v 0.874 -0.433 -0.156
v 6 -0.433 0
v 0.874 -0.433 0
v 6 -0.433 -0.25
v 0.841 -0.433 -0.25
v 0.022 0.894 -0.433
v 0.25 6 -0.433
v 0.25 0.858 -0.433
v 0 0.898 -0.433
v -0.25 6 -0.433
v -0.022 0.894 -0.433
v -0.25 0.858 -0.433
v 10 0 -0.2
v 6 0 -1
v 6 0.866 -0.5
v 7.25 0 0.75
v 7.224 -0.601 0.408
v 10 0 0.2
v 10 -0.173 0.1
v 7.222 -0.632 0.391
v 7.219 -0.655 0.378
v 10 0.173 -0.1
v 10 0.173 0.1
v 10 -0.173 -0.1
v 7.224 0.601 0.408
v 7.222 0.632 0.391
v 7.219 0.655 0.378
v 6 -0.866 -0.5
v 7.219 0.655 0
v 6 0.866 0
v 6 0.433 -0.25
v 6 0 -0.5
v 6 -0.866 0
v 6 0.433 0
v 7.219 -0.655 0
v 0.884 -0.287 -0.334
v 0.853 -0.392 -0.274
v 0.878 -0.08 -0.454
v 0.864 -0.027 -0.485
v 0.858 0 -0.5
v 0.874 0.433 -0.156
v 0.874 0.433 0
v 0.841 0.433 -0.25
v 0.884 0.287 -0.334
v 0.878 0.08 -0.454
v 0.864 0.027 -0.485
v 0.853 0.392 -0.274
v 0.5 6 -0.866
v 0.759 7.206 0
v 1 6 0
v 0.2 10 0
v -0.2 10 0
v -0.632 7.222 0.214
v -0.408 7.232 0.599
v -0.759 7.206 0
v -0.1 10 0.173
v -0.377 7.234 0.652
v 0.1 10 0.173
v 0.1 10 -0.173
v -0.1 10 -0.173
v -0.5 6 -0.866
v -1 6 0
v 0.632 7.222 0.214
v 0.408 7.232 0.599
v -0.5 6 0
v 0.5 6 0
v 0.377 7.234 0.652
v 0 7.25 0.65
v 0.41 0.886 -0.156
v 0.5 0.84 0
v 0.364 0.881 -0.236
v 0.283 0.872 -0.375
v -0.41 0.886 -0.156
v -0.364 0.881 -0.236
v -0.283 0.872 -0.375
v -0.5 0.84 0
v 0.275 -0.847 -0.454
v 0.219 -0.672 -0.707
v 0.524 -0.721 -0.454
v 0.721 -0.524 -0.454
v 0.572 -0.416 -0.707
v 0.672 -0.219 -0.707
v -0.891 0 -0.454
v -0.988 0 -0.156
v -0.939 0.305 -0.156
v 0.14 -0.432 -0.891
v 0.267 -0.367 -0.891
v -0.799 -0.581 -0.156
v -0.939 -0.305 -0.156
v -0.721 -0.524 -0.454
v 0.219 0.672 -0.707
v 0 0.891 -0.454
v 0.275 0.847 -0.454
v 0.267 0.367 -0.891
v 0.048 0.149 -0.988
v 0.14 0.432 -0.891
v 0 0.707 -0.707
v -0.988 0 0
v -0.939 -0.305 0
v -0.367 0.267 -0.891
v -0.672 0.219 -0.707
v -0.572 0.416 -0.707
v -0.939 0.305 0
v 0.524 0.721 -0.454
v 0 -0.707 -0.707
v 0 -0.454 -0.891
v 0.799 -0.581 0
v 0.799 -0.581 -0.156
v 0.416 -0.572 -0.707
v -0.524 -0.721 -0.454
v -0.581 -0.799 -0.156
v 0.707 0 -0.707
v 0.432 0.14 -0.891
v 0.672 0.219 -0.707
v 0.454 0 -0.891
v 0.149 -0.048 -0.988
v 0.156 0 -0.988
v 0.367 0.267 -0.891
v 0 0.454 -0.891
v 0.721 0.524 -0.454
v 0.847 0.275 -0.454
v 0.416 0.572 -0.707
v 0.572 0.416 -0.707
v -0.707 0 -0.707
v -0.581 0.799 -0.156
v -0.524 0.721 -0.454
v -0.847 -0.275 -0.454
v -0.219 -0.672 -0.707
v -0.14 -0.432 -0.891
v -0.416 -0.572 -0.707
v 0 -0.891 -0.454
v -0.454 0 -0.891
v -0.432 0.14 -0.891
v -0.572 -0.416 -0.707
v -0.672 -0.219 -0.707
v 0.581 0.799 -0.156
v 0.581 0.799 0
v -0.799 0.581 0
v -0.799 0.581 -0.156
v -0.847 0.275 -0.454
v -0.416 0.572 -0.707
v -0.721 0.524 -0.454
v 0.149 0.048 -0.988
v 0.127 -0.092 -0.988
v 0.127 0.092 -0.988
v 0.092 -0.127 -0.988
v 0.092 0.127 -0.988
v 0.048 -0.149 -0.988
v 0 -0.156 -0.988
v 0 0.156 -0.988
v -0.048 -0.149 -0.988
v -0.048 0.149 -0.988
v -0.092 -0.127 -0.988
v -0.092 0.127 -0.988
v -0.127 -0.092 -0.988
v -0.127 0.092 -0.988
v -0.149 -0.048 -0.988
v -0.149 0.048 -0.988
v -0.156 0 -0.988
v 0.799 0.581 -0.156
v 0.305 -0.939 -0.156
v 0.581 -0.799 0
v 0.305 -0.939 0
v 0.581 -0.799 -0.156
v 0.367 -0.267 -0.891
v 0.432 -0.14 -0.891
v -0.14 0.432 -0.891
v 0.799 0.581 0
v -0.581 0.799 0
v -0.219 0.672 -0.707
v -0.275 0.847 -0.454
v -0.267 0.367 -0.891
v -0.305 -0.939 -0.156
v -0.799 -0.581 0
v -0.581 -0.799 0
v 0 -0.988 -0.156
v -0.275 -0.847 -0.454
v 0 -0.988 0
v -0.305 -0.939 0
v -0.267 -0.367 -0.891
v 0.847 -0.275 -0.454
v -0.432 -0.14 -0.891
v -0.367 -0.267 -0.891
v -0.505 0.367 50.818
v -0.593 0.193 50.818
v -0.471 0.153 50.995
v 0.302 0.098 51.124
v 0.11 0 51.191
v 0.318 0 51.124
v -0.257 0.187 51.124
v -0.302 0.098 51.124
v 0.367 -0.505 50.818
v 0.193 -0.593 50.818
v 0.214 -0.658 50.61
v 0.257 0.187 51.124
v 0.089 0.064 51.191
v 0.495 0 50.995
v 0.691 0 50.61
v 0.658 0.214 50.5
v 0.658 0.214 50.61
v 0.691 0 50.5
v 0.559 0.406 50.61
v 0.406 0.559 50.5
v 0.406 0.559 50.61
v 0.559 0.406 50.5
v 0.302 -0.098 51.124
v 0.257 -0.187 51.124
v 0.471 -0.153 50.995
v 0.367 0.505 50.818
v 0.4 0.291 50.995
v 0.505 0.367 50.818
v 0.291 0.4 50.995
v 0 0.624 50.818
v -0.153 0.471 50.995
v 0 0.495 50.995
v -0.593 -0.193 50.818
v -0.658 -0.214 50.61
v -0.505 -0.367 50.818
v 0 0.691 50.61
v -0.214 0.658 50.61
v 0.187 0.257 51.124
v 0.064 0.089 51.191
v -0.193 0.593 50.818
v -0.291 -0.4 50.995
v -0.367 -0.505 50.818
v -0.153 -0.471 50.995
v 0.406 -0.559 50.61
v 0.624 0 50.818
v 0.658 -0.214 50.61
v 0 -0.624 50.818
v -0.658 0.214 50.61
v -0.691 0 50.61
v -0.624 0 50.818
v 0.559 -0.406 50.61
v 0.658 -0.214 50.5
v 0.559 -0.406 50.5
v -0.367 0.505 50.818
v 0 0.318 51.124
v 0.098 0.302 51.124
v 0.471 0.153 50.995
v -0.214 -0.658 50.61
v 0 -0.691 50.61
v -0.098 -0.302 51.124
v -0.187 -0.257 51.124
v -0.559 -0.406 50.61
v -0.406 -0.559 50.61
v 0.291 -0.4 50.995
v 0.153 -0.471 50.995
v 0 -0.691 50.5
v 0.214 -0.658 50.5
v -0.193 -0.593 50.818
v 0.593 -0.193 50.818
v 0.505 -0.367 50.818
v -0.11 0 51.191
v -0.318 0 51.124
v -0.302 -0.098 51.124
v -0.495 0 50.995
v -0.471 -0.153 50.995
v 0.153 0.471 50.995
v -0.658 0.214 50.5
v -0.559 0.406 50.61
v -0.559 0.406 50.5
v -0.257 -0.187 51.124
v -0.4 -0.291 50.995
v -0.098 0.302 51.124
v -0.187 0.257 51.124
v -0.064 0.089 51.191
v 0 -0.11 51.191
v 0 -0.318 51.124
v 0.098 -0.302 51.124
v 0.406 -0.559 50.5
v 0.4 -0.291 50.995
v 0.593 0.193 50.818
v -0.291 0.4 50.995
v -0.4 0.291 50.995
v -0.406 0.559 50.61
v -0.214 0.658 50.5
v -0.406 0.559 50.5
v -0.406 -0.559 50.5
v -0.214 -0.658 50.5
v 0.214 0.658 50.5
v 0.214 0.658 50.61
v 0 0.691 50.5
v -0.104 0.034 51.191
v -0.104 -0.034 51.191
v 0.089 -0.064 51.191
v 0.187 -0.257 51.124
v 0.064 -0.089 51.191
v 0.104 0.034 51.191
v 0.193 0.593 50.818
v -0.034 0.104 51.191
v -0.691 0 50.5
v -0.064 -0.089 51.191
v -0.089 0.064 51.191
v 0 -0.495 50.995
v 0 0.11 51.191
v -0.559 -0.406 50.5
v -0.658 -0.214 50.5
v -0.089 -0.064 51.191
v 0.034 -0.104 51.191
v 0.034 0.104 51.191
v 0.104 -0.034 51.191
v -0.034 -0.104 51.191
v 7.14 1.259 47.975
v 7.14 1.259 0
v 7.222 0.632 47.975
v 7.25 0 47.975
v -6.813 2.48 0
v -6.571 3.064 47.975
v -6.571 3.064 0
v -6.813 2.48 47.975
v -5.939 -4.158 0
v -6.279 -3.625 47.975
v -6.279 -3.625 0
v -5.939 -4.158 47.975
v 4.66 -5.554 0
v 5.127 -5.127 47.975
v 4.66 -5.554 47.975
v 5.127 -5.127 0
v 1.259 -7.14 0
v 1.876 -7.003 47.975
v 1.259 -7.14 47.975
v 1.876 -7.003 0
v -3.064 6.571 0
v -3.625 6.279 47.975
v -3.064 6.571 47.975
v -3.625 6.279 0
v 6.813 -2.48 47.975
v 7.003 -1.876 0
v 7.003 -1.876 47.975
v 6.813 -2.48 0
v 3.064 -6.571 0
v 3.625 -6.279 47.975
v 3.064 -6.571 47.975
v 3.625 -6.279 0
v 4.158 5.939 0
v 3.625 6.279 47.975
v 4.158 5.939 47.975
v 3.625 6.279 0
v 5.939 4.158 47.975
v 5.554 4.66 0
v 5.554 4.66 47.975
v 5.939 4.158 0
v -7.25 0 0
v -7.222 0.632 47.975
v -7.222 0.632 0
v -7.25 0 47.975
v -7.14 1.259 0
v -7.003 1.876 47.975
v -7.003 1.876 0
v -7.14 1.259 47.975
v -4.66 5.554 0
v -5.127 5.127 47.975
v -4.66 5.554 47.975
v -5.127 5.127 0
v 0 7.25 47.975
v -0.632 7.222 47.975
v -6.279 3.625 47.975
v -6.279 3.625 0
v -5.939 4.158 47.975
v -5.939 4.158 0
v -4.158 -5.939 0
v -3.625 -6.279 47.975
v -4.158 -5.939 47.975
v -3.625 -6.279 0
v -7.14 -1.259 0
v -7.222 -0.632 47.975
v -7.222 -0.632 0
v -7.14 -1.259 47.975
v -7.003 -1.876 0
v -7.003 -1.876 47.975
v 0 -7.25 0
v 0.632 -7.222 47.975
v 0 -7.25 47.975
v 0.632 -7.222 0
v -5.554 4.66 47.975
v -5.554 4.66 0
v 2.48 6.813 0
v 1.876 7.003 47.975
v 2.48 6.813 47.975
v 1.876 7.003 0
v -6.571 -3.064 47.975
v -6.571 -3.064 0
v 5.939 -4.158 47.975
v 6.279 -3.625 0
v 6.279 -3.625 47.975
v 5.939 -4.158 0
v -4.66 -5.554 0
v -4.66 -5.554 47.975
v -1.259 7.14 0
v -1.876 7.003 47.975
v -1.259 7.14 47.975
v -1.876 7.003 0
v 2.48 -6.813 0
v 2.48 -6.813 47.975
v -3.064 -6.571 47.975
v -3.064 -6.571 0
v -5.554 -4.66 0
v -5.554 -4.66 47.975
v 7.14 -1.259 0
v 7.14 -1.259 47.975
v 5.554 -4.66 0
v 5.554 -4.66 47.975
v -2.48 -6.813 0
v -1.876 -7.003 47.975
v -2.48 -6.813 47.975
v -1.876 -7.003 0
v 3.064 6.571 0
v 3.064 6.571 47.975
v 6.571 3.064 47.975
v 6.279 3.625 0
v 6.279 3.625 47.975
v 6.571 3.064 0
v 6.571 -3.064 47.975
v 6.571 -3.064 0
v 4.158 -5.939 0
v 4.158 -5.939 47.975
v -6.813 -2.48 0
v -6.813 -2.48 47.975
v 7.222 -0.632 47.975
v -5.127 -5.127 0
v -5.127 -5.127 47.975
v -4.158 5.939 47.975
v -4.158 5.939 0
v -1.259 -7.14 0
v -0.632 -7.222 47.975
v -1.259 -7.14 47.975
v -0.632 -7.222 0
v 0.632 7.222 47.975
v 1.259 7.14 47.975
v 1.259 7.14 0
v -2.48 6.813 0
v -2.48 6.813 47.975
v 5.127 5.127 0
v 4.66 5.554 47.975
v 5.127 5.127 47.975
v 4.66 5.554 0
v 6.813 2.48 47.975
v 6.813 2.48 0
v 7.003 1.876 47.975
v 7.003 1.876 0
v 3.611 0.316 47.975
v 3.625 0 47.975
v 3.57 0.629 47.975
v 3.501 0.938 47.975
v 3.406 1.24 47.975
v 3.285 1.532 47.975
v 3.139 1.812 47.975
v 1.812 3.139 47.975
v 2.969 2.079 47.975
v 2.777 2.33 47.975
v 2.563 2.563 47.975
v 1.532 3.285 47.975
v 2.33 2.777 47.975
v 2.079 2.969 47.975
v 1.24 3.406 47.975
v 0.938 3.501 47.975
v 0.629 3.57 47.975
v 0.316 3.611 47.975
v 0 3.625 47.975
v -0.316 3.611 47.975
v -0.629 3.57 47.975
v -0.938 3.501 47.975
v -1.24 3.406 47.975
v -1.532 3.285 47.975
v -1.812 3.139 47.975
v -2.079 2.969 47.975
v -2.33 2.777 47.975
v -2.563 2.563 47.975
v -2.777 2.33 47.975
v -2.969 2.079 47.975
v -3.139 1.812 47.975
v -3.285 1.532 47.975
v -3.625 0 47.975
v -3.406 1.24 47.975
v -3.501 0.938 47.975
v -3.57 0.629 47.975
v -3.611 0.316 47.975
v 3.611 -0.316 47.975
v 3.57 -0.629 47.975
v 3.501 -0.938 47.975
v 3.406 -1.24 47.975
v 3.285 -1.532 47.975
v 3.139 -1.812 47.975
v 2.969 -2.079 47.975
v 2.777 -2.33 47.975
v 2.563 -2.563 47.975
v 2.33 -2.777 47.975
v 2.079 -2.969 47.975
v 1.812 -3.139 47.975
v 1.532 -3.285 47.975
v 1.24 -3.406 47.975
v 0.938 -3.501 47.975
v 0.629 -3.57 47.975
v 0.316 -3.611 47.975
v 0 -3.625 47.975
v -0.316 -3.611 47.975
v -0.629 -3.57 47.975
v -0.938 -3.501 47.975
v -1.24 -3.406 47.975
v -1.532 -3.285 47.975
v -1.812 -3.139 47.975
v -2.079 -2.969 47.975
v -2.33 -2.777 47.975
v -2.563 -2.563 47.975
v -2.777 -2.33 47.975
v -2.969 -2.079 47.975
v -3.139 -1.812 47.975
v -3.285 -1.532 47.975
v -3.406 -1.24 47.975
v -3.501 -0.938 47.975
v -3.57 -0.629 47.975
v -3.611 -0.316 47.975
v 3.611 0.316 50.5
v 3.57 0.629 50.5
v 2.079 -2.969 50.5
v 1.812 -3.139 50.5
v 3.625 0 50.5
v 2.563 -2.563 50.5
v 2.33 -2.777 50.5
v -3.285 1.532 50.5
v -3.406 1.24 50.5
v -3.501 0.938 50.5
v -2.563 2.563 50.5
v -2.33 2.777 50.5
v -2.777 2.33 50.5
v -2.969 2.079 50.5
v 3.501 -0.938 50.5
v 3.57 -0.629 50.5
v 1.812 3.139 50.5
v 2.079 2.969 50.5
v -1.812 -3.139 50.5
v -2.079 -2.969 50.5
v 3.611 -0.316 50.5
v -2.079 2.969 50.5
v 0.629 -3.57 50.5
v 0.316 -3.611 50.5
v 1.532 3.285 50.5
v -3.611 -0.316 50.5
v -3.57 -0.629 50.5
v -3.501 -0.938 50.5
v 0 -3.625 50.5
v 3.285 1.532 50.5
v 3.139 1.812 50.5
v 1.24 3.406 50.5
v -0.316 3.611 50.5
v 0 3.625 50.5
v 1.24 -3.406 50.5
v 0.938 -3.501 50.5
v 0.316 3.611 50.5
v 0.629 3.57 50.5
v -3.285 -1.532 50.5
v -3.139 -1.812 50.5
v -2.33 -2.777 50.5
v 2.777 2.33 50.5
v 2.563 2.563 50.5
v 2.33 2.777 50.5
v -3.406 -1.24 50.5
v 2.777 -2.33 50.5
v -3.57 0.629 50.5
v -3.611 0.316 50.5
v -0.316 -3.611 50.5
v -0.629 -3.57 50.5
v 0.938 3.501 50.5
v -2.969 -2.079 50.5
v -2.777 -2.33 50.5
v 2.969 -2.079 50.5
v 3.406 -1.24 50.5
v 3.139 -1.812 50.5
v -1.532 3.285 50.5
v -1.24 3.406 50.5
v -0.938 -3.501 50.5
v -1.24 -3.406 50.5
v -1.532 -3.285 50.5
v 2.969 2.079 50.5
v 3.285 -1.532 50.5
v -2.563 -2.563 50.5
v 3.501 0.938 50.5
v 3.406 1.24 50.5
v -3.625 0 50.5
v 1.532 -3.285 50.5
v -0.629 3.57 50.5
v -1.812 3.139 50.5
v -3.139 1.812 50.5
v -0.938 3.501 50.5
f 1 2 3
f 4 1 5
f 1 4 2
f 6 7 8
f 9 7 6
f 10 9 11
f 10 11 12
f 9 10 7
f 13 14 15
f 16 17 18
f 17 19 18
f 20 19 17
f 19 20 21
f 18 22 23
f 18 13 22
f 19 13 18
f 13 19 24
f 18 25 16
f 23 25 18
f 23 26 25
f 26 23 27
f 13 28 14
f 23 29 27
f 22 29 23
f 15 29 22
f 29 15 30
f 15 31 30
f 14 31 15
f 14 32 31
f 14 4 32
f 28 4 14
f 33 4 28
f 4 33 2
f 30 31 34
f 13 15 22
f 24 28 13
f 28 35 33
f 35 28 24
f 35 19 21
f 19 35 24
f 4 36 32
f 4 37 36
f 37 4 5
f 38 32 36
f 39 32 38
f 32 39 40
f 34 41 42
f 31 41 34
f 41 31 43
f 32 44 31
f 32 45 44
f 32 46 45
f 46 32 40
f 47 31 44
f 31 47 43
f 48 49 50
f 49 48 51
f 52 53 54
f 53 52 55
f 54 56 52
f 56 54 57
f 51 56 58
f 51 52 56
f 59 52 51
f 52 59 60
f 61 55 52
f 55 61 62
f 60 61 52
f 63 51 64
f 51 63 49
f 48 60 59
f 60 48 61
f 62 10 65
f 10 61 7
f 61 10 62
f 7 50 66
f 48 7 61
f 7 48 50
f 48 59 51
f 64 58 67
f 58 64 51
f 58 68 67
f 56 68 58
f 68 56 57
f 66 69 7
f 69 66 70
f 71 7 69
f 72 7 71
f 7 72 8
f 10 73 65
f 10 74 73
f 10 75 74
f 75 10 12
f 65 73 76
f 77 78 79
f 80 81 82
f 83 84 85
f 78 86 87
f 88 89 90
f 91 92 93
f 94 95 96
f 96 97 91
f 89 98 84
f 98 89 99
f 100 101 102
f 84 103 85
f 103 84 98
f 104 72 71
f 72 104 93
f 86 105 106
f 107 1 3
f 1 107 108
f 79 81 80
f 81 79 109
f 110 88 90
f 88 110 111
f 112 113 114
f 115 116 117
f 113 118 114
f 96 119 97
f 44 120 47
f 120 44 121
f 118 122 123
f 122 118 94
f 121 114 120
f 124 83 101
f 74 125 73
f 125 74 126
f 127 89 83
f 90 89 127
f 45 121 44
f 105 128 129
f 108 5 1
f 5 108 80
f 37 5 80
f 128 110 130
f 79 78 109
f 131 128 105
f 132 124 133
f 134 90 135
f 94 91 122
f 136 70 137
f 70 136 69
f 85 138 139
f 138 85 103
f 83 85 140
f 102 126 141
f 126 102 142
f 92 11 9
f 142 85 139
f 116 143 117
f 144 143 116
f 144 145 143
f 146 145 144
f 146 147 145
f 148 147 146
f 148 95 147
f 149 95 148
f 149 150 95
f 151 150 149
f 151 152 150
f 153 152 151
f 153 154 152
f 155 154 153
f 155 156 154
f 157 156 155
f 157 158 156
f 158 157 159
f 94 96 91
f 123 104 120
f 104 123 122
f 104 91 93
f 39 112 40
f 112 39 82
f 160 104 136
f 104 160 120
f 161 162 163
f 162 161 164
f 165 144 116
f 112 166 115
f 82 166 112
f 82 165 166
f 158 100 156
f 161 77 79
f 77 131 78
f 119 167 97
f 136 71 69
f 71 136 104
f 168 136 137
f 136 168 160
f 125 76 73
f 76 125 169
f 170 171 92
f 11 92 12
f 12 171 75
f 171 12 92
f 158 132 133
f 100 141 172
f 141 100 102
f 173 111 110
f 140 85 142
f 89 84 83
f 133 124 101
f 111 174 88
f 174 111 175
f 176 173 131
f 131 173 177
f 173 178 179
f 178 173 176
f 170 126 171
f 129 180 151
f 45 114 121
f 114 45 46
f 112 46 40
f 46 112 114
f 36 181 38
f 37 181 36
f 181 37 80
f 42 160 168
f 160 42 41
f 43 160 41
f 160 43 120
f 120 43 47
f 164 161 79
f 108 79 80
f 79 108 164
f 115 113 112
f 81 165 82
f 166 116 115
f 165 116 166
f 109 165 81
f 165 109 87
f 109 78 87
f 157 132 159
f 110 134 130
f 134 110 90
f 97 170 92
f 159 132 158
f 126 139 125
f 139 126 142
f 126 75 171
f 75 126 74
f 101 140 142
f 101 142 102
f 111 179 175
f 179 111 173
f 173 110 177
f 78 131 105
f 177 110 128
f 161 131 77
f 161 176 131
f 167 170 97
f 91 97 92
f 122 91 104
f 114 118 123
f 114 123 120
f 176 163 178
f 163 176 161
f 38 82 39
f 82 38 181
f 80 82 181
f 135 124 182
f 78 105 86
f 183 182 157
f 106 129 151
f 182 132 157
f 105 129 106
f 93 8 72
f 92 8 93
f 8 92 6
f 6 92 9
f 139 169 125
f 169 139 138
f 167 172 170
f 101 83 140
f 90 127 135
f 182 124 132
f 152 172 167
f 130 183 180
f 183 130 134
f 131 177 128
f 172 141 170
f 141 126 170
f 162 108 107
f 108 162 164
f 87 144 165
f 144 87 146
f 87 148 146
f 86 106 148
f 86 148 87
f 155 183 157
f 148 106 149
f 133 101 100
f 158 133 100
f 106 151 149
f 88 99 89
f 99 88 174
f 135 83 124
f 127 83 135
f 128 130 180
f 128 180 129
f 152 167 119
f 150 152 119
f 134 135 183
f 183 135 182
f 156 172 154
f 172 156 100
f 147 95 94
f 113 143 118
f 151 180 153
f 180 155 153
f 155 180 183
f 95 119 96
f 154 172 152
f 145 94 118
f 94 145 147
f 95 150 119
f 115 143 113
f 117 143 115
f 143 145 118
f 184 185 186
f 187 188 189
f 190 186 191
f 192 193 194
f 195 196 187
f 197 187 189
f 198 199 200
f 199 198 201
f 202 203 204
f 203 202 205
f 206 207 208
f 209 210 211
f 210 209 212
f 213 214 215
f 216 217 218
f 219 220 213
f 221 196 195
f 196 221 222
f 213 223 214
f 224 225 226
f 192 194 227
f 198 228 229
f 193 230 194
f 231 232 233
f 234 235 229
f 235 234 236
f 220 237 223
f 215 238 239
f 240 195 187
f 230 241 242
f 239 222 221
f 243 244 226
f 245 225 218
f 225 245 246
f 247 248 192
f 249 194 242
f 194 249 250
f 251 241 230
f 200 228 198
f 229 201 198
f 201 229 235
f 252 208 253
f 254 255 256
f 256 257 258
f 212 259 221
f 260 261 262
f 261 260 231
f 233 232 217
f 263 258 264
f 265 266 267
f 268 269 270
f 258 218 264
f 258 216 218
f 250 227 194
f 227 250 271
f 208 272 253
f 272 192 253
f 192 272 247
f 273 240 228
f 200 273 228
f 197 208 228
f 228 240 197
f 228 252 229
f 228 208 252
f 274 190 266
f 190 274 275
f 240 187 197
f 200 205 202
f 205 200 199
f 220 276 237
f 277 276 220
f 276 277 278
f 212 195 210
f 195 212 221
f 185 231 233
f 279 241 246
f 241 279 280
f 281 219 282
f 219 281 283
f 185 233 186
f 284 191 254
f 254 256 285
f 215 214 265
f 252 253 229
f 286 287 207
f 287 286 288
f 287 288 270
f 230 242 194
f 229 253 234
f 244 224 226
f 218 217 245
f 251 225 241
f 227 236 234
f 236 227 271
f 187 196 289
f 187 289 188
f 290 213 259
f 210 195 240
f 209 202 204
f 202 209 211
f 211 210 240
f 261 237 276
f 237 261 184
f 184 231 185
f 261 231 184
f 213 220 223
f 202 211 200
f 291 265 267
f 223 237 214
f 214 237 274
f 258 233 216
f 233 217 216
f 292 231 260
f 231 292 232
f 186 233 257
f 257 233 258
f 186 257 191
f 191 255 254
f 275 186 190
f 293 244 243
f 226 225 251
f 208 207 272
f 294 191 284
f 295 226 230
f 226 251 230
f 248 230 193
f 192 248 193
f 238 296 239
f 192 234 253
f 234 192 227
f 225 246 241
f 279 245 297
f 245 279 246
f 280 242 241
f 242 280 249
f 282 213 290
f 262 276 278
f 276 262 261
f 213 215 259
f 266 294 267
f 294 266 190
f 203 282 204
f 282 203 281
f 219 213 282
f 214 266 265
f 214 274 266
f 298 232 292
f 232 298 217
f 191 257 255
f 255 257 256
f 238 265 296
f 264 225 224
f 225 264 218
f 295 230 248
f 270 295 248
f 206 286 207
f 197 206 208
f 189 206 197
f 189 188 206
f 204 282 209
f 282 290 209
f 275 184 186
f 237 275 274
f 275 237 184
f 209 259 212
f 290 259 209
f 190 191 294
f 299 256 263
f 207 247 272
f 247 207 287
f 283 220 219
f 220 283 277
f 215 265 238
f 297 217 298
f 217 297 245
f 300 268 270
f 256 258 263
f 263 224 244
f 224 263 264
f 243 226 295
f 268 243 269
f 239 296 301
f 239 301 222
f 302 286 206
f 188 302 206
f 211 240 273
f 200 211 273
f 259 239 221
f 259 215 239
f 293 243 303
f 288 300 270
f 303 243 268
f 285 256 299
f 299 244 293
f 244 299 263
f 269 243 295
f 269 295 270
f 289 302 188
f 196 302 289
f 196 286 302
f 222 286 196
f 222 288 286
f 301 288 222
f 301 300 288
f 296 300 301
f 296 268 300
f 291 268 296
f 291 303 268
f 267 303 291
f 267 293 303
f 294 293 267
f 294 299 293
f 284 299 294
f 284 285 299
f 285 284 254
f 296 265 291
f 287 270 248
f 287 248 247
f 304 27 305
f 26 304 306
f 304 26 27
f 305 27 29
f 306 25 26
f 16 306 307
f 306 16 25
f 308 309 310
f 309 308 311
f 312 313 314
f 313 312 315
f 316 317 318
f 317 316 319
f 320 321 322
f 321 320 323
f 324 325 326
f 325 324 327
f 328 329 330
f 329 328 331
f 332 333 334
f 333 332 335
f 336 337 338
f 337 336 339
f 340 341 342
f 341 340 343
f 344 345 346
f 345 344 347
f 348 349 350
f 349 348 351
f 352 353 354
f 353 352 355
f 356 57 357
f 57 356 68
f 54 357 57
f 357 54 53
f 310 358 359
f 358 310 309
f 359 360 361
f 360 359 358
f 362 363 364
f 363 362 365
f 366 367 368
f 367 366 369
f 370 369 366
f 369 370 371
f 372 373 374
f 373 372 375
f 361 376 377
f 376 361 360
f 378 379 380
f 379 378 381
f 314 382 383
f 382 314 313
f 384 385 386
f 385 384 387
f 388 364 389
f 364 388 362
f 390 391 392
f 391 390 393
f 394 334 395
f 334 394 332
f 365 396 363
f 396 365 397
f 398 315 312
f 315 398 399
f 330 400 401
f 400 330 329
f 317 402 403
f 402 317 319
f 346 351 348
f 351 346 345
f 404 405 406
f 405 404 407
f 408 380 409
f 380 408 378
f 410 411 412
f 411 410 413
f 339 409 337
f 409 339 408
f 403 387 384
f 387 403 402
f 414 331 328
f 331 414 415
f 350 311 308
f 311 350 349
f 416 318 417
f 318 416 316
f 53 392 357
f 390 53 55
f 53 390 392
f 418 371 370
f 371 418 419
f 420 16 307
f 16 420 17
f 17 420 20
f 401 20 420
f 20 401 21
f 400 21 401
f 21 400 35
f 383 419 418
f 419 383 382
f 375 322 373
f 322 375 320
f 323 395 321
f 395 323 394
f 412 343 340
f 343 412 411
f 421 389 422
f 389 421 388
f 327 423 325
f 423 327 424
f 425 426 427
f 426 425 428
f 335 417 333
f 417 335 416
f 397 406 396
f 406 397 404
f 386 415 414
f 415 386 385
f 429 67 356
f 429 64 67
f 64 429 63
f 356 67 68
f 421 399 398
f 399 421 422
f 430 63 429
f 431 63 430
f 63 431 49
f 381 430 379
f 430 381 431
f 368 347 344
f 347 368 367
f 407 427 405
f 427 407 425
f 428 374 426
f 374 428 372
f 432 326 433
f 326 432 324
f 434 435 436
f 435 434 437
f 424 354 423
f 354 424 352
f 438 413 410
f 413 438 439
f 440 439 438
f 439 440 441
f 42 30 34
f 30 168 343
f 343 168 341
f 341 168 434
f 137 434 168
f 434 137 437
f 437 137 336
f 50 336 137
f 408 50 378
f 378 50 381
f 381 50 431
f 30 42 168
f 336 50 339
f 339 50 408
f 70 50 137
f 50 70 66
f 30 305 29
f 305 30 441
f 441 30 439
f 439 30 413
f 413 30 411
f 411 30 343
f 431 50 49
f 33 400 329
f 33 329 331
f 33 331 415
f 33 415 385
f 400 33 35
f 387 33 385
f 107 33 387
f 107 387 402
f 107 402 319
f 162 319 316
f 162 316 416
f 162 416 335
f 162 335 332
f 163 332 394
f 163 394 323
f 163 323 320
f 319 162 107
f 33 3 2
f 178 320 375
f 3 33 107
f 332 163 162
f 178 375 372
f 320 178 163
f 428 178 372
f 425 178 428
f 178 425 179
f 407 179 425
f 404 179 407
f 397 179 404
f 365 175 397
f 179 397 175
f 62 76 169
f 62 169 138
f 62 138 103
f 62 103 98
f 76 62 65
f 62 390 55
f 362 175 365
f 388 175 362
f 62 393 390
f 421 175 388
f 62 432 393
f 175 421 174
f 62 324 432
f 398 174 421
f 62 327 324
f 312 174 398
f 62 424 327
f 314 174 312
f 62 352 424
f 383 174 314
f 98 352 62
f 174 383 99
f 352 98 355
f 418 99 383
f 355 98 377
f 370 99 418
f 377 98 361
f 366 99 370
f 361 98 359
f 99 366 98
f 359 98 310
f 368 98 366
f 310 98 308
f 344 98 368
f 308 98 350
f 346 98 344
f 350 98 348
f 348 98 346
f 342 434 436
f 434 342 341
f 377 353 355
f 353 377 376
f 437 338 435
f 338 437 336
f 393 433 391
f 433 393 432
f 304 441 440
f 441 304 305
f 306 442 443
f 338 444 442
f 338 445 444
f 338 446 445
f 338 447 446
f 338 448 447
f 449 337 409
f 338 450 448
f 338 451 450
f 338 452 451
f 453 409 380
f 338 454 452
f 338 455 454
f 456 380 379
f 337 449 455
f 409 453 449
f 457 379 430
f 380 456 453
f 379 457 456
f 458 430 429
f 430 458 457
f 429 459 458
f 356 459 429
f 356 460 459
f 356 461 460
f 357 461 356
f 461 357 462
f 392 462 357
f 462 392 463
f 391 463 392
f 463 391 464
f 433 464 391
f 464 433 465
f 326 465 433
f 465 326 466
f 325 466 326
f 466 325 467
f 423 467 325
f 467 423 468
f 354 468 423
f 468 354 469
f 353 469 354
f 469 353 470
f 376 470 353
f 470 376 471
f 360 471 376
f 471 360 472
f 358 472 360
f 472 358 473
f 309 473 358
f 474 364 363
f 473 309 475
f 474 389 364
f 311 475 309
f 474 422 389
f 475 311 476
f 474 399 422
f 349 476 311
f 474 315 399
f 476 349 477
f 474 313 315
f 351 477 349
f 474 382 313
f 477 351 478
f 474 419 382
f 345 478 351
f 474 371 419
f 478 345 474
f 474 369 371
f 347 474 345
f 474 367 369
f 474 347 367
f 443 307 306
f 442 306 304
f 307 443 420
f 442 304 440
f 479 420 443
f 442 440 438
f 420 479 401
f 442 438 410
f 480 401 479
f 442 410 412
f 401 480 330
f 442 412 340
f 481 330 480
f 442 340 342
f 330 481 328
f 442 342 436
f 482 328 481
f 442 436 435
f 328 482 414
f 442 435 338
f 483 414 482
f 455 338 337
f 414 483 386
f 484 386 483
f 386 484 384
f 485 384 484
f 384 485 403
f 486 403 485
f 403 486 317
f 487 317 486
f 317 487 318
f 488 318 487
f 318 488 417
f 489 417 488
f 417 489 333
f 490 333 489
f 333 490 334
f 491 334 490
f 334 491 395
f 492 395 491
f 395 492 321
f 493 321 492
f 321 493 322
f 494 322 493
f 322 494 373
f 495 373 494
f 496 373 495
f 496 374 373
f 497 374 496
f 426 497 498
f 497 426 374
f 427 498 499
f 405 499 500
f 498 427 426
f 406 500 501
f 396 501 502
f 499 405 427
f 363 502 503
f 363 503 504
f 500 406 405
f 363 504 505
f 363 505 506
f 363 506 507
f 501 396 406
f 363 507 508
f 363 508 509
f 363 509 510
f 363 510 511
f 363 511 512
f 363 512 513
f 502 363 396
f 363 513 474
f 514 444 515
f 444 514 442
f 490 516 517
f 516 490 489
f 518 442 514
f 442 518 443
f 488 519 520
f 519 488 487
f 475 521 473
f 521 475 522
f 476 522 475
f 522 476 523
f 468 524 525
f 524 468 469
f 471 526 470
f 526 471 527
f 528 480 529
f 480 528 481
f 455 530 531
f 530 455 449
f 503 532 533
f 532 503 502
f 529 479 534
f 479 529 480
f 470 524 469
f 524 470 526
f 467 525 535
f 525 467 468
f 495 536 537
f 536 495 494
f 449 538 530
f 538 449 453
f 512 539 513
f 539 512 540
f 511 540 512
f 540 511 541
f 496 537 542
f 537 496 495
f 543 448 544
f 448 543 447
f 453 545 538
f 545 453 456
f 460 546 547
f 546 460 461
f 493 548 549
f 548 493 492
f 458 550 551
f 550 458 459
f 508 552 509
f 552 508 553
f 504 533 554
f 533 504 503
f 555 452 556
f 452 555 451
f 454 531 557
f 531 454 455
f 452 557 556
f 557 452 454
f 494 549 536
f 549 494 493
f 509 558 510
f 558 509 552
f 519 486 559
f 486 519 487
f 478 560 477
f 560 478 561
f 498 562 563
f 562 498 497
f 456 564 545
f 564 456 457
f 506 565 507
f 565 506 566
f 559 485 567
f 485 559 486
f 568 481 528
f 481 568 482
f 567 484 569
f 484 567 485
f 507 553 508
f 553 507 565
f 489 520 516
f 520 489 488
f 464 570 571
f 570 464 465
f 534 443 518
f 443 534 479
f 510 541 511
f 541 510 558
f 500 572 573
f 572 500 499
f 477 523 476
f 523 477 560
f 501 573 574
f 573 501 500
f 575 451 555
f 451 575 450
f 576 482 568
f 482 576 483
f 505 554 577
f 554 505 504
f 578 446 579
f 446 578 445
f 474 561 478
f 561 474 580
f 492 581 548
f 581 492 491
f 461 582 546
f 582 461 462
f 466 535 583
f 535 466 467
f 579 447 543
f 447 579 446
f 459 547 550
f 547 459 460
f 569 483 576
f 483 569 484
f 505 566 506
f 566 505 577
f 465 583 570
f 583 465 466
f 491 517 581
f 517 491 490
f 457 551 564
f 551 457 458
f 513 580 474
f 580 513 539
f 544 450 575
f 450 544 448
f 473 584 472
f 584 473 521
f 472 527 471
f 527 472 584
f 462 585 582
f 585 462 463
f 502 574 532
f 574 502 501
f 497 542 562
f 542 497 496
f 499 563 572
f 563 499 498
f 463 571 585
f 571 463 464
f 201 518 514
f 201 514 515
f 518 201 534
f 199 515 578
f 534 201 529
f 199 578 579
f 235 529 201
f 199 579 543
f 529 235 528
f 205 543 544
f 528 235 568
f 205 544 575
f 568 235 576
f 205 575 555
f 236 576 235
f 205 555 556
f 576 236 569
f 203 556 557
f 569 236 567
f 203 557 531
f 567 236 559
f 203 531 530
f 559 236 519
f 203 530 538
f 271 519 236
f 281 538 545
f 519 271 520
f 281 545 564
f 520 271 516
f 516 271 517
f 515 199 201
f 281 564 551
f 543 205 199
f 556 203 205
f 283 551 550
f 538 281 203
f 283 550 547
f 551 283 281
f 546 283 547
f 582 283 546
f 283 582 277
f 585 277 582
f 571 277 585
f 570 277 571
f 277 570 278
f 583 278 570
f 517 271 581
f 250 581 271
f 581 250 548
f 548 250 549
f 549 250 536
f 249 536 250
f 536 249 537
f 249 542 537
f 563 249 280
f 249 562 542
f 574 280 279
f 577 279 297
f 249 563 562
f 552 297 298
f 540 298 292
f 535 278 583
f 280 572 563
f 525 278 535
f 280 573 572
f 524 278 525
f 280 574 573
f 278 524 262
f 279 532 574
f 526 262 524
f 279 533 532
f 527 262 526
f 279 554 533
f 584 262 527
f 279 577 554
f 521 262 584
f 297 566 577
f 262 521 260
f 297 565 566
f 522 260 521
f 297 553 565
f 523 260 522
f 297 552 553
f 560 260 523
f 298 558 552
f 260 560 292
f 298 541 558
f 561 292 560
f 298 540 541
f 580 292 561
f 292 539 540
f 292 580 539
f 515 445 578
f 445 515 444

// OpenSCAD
include <../config/config.scad>
UseSTL=false;
UseVitaminSTL=true;
DebugConnectors=true;
DebugCoordinateFrames=true;
Battery();
